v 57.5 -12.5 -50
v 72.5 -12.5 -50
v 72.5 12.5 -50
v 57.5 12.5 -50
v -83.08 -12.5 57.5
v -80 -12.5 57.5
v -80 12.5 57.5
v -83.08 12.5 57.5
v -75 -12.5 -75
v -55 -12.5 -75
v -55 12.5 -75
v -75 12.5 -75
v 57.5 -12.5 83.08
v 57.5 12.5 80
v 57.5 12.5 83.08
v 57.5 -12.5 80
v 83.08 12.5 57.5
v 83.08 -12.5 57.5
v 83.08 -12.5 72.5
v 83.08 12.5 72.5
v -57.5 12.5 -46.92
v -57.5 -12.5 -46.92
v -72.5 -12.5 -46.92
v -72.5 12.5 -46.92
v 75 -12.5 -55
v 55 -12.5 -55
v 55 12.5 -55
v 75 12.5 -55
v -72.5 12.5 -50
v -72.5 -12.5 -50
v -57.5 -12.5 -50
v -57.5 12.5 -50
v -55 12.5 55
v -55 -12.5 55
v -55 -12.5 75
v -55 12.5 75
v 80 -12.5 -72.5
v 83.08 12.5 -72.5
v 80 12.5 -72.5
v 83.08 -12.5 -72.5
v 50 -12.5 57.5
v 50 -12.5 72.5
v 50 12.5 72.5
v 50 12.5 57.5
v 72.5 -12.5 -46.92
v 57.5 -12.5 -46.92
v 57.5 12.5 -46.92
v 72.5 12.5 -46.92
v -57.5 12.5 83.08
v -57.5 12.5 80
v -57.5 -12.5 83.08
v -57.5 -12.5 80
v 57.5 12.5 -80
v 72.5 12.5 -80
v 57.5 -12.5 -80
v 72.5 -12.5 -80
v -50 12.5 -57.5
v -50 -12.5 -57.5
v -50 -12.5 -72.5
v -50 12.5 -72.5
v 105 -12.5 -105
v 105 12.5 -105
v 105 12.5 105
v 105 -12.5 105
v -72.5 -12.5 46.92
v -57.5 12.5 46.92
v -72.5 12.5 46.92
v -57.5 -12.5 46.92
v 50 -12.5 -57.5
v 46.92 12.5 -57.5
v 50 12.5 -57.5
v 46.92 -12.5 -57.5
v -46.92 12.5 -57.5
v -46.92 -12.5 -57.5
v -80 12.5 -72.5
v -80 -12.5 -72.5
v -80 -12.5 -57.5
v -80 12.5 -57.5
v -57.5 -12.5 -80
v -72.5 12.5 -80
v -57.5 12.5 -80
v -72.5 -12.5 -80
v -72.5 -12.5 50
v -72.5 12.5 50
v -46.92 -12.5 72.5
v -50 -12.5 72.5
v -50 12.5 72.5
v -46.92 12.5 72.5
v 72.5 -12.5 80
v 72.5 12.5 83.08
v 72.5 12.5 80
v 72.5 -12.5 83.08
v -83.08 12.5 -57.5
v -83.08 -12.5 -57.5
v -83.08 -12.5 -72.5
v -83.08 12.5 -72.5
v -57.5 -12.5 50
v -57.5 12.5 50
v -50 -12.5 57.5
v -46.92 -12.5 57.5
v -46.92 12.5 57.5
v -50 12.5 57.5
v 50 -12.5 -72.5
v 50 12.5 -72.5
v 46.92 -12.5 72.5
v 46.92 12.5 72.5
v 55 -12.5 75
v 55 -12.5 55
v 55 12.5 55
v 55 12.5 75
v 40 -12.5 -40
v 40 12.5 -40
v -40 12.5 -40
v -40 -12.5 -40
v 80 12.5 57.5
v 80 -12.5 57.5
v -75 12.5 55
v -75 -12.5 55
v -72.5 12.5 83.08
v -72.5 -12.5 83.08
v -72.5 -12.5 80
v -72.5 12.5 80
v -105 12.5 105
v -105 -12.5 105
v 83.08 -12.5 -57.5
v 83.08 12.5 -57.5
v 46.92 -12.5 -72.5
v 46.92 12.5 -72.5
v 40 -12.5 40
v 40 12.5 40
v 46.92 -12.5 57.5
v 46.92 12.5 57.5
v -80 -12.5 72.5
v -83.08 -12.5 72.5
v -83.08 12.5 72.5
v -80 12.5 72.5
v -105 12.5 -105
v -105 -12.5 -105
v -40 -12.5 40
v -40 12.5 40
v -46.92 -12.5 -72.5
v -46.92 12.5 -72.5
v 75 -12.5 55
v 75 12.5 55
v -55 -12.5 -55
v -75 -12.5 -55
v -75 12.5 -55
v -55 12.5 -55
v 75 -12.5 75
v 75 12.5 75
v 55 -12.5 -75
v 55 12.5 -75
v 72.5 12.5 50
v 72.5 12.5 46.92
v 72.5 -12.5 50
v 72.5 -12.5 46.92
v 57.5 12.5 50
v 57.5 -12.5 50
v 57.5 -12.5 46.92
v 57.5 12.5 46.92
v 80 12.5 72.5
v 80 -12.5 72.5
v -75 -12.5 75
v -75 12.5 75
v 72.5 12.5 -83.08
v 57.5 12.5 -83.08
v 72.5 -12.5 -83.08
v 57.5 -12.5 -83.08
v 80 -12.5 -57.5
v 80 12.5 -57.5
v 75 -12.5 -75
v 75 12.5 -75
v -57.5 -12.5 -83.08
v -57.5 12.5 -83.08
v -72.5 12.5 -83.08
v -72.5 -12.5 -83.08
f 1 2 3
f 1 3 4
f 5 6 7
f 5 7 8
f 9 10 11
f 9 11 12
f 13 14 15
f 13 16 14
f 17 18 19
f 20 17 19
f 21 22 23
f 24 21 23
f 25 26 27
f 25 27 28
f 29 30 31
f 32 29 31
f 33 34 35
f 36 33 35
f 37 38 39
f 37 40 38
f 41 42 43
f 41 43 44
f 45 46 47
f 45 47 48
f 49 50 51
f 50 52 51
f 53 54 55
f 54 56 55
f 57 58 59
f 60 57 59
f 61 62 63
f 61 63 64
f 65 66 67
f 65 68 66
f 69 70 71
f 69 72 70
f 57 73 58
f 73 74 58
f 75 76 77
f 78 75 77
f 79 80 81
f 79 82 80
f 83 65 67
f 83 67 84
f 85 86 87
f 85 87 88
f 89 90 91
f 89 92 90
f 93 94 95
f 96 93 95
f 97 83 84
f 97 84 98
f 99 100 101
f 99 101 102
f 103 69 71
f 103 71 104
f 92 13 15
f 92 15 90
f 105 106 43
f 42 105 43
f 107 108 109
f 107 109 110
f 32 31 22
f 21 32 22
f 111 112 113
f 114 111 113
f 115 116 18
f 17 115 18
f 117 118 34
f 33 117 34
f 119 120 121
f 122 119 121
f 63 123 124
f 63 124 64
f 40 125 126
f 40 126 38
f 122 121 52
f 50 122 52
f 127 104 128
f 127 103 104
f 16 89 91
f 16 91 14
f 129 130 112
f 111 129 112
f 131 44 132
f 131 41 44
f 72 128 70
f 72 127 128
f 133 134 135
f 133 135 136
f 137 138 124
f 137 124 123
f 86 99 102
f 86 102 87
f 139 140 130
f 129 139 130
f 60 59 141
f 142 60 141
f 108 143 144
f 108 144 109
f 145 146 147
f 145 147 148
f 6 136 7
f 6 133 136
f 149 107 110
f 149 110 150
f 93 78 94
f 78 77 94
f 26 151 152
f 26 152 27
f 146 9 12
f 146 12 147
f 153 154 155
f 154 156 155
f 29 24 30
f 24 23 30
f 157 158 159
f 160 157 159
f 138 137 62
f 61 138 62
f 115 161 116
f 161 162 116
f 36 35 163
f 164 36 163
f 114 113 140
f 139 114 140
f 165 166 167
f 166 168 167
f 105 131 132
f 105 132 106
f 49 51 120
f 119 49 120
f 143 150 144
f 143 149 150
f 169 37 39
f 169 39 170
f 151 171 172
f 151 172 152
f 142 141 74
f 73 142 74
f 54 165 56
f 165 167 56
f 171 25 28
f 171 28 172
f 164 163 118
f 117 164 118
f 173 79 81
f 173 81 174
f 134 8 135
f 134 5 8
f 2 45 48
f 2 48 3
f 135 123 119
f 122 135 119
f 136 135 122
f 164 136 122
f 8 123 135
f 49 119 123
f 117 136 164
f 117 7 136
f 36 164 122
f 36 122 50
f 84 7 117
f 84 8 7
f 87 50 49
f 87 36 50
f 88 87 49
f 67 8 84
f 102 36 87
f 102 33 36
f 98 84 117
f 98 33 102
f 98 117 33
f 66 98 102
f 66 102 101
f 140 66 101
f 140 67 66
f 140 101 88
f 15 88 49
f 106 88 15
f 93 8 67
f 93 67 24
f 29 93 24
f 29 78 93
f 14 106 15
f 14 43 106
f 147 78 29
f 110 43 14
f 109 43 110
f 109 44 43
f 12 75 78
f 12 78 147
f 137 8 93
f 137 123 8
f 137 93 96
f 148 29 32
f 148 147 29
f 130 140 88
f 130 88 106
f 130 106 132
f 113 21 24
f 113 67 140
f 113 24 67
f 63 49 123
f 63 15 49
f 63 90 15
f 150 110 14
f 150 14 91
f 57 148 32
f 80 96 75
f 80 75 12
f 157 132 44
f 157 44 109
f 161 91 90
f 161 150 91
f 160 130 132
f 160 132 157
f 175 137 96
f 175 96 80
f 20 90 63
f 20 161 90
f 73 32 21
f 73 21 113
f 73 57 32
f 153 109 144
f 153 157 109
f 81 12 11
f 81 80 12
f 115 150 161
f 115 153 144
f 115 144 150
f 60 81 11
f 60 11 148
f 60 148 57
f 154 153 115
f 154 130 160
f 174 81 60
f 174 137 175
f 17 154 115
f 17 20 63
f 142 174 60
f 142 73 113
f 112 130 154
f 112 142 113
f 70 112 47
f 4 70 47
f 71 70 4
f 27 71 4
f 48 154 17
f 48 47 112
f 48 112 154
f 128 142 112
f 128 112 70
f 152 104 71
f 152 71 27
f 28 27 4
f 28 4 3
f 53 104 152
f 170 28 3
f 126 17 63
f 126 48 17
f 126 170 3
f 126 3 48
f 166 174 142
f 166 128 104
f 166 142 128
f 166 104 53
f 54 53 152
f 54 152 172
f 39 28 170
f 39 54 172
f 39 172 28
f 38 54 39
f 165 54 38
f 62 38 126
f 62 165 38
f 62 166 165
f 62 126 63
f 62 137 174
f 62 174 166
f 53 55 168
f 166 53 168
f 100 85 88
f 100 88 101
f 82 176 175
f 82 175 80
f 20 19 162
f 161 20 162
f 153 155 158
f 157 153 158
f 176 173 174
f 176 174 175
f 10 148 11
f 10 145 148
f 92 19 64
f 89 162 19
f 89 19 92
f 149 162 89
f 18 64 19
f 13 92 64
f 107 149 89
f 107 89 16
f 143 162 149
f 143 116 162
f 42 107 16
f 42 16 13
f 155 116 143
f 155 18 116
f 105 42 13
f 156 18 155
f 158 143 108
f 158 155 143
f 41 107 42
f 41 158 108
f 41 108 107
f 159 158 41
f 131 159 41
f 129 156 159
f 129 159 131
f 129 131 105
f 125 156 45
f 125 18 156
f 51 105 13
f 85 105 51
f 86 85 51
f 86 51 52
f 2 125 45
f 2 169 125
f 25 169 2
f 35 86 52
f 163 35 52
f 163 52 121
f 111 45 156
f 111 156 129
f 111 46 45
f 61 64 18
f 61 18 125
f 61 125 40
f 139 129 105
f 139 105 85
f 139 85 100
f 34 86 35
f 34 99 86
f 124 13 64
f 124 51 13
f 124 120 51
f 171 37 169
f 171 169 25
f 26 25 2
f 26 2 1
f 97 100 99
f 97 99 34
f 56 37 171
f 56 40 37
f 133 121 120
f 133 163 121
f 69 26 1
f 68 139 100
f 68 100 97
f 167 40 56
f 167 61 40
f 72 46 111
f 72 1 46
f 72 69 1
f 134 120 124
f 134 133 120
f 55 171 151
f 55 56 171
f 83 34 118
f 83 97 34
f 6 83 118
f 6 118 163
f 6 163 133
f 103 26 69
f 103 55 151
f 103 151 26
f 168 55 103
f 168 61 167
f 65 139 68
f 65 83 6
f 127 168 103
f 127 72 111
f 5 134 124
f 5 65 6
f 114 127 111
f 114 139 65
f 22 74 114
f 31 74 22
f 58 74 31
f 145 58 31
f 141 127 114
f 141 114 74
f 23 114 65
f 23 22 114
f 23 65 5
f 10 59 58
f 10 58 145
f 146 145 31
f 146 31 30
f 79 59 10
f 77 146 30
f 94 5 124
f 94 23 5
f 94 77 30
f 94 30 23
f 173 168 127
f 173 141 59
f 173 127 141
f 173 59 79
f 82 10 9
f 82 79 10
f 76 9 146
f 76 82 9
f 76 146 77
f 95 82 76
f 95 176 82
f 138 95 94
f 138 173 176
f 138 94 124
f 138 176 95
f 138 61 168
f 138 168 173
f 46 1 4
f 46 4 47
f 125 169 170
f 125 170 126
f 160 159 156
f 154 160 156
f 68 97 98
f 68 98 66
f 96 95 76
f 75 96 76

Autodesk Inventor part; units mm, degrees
ref_plane "YZ Plane" through (0, 0, 0) normal (1, 0, 0) x (0, 1, 0)
ref_plane "XZ Plane" through (0, 0, 0) normal (0, 1, 0) x (-1, 0, 0)
ref_plane "XY Plane" through (0, 0, 0) normal (0, 0, 1) x (1, 0, 0)
sketch "Sketch1" plane through (0, 0, 0) normal (0, 0, 1) x (1, 0, 0)
  line L0 (-105, 12.5) -> (105, 12.5)
  line L1 (105, 12.5) -> (105, -12.5)
  line L2 (105, -12.5) -> (-105, -12.5)
  line L3 (-105, -12.5) -> (-105, 12.5)
  line L4 (-105, 12.5) -> (105, -12.5) construction
  line L5 (105, 12.5) -> (-105, -12.5) construction
  point P0 (0, 0)
  dimension "d0" = 210
  dimension "d1" = 25
extrude "Extrusion1" add sketch "Sketch1" along normal mid plane 210
sketch "Sketch2" plane through (-105, -12.5, 105) normal (0, -1, 0) x (1, 0, 0)
  line L0 (0, -210) -> (0, 0) projected
  line L1 (0, -40) -> (210, -40)
  line L2 (210, -210) -> (210, 0) projected
  line L3 (0, -170) -> (210, -170)
  line L4 (0, -105) -> (210, -105)
  line L5 (0, 0) -> (210, 0) projected
  line L6 (105, 0) -> (105, -210)
  line L7 (170, 0) -> (170, -210)
  line L8 (40, 0) -> (40, -210)
  line L9 (210, -210) -> (0, -210) projected
  line L10 (0, 0) -> (0, -210) projected
  line L11 (162.5, -21.92) -> (177.5, -21.92)
  line L12 (177.5, -21.92) -> (177.5, -25)
  line L13 (177.5, -25) -> (162.5, -25)
  line L14 (162.5, -25) -> (162.5, -21.92)
  line L15 (162.5, -21.92) -> (177.5, -25) construction
  line L16 (177.5, -21.92) -> (162.5, -25) construction
  line L17 (188.08, -32.5) -> (185, -32.5)
  line L18 (185, -32.5) -> (185, -47.5)
  line L19 (185, -47.5) -> (188.08, -47.5)
  line L20 (188.08, -47.5) -> (188.08, -32.5)
  line L21 (188.08, -32.5) -> (185, -47.5) construction
  line L22 (185, -32.5) -> (188.08, -47.5) construction
  line L23 (162.5, -58.08) -> (177.5, -58.08)
  line L24 (177.5, -58.08) -> (177.5, -55)
  line L25 (177.5, -55) -> (162.5, -55)
  line L26 (162.5, -55) -> (162.5, -58.08)
  line L27 (162.5, -58.08) -> (177.5, -55) construction
  line L28 (177.5, -58.08) -> (162.5, -55) construction
  line L29 (188.08, -47.5) -> (185, -47.5)
  line L30 (185, -47.5) -> (185, -32.5)
  line L31 (185, -32.5) -> (188.08, -32.5)
  line L32 (188.08, -32.5) -> (188.08, -47.5)
  line L33 (188.08, -47.5) -> (185, -32.5) construction
  line L34 (185, -47.5) -> (188.08, -32.5) construction
  line L35 (151.92, -32.5) -> (155, -32.5)
  line L36 (155, -32.5) -> (155, -47.5)
  line L37 (155, -47.5) -> (151.92, -47.5)
  line L38 (151.92, -47.5) -> (151.92, -32.5)
  line L39 (151.92, -32.5) -> (155, -47.5) construction
  line L40 (155, -32.5) -> (151.92, -47.5) construction
  line L41 (155, -32.5) -> (151.92, -32.5)
  line L42 (155, -47.5) -> (155, -32.5)
  line L43 (151.92, -32.5) -> (151.92, -47.5)
  line L44 (155, -47.5) -> (151.92, -32.5) construction
  line L45 (151.92, -47.5) -> (155, -47.5)
  line L46 (151.92, -47.5) -> (155, -32.5) construction
  line L47 (47.5, -21.92) -> (32.5, -21.92)
  line L48 (32.5, -21.92) -> (32.5, -25)
  line L49 (32.5, -25) -> (47.5, -25)
  line L50 (47.5, -25) -> (47.5, -21.92)
  line L51 (47.5, -21.92) -> (32.5, -25) construction
  line L52 (32.5, -21.92) -> (47.5, -25) construction
  line L53 (21.92, -32.5) -> (25, -32.5)
  line L54 (25, -32.5) -> (25, -47.5)
  line L55 (25, -47.5) -> (21.92, -47.5)
  line L56 (21.92, -47.5) -> (21.92, -32.5)
  line L57 (21.92, -32.5) -> (25, -47.5) construction
  line L58 (25, -32.5) -> (21.92, -47.5) construction
  line L59 (32.5, -55) -> (47.5, -55)
  line L60 (47.5, -58.08) -> (32.5, -58.08)
  line L61 (32.5, -58.08) -> (47.5, -55) construction
  line L62 (47.5, -58.08) -> (32.5, -55) construction
  line L63 (47.5, -55) -> (47.5, -58.08)
  line L64 (32.5, -58.08) -> (32.5, -55)
  line L65 (25, -32.5) -> (21.92, -32.5)
  line L66 (25, -47.5) -> (25, -32.5)
  line L67 (21.92, -32.5) -> (21.92, -47.5)
  line L68 (25, -47.5) -> (21.92, -32.5) construction
  line L69 (21.92, -47.5) -> (25, -47.5)
  line L70 (21.92, -47.5) -> (25, -32.5) construction
  line L71 (55, -32.5) -> (58.08, -32.5)
  line L72 (58.08, -32.5) -> (55, -32.5)
  line L73 (55, -47.5) -> (55, -32.5)
  line L74 (55, -32.5) -> (55, -47.5)
  line L75 (58.08, -47.5) -> (55, -47.5)
  line L76 (58.08, -32.5) -> (58.08, -47.5)
  line L77 (55, -47.5) -> (58.08, -32.5) construction
  line L78 (58.08, -47.5) -> (55, -32.5) construction
  line L79 (55, -47.5) -> (58.08, -47.5)
  line L80 (58.08, -47.5) -> (58.08, -32.5)
  line L81 (55, -32.5) -> (58.08, -47.5) construction
  line L82 (58.08, -32.5) -> (55, -47.5) construction
  line L83 (162.5, -188.08) -> (177.5, -188.08)
  line L84 (177.5, -188.08) -> (177.5, -185)
  line L85 (177.5, -185) -> (162.5, -185)
  line L86 (162.5, -185) -> (162.5, -188.08)
  line L87 (162.5, -188.08) -> (177.5, -185) construction
  line L88 (177.5, -188.08) -> (162.5, -185) construction
  line L89 (188.08, -177.5) -> (185, -177.5)
  line L90 (185, -177.5) -> (185, -162.5)
  line L91 (185, -162.5) -> (188.08, -162.5)
  line L92 (188.08, -162.5) -> (188.08, -177.5)
  line L93 (188.08, -177.5) -> (185, -162.5) construction
  line L94 (185, -177.5) -> (188.08, -162.5) construction
  line L95 (177.5, -155) -> (162.5, -155)
  line L96 (162.5, -151.92) -> (177.5, -151.92)
  line L97 (177.5, -151.92) -> (162.5, -155) construction
  line L98 (162.5, -151.92) -> (177.5, -155) construction
  line L99 (162.5, -155) -> (162.5, -151.92)
  line L100 (177.5, -151.92) -> (177.5, -155)
  line L101 (185, -177.5) -> (188.08, -177.5)
  line L102 (185, -162.5) -> (185, -177.5)
  line L103 (188.08, -177.5) -> (188.08, -162.5)
  line L104 (185, -162.5) -> (188.08, -177.5) construction
  line L105 (188.08, -162.5) -> (185, -162.5)
  line L106 (188.08, -162.5) -> (185, -177.5) construction
  line L107 (155, -177.5) -> (151.92, -177.5)
  line L108 (151.92, -177.5) -> (155, -177.5)
  line L109 (155, -162.5) -> (155, -177.5)
  line L110 (155, -177.5) -> (155, -162.5)
  line L111 (151.92, -162.5) -> (155, -162.5)
  line L112 (151.92, -177.5) -> (151.92, -162.5)
  line L113 (155, -162.5) -> (151.92, -177.5) construction
  line L114 (151.92, -162.5) -> (155, -177.5) construction
  line L115 (155, -162.5) -> (151.92, -162.5)
  line L116 (151.92, -162.5) -> (151.92, -177.5)
  line L117 (155, -177.5) -> (151.92, -162.5) construction
  line L118 (151.92, -177.5) -> (155, -162.5) construction
  line L119 (55, -177.5) -> (58.08, -177.5)
  line L120 (58.08, -177.5) -> (58.08, -162.5)
  line L121 (55, -162.5) -> (58.08, -177.5) construction
  line L122 (58.08, -162.5) -> (55, -177.5) construction
  line L123 (58.08, -177.5) -> (55, -177.5)
  line L124 (58.08, -162.5) -> (58.08, -177.5)
  line L125 (55, -177.5) -> (58.08, -162.5) construction
  line L126 (58.08, -177.5) -> (55, -162.5) construction
  line L127 (58.08, -162.5) -> (55, -162.5)
  line L128 (55, -162.5) -> (58.08, -162.5)
  line L129 (25, -162.5) -> (21.92, -162.5)
  line L130 (21.92, -162.5) -> (25, -162.5)
  line L131 (25, -177.5) -> (25, -162.5)
  line L132 (25, -162.5) -> (25, -177.5)
  line L133 (21.92, -162.5) -> (21.92, -177.5)
  line L134 (25, -177.5) -> (21.92, -162.5) construction
  line L135 (21.92, -177.5) -> (25, -162.5) construction
  line L136 (21.92, -177.5) -> (25, -177.5)
  line L137 (21.92, -162.5) -> (25, -177.5) construction
  line L138 (21.92, -177.5) -> (21.92, -162.5)
  line L139 (25, -177.5) -> (21.92, -177.5)
  line L140 (25, -162.5) -> (21.92, -177.5) construction
  line L141 (47.5, -188.08) -> (32.5, -188.08)
  line L142 (32.5, -188.08) -> (32.5, -185)
  line L143 (32.5, -185) -> (47.5, -185)
  line L144 (47.5, -185) -> (47.5, -188.08)
  line L145 (47.5, -188.08) -> (32.5, -185) construction
  line L146 (32.5, -188.08) -> (47.5, -185) construction
  line L147 (55, -162.5) -> (55, -177.5)
  line L148 (55, -177.5) -> (55, -162.5)
  line L149 (32.5, -151.92) -> (32.5, -155)
  line L150 (32.5, -155) -> (47.5, -155)
  line L151 (32.5, -151.92) -> (47.5, -155) construction
  line L152 (47.5, -151.92) -> (32.5, -155) construction
  line L153 (47.5, -155) -> (47.5, -151.92)
  line L154 (47.5, -151.92) -> (32.5, -151.92)
  line L155 (160, -30) -> (180, -30)
  line L156 (180, -30) -> (180, -50)
  line L157 (180, -50) -> (160, -50)
  line L158 (160, -50) -> (160, -30)
  line L159 (160, -30) -> (180, -50) construction
  line L160 (180, -30) -> (160, -50) construction
  line L161 (30, -50) -> (50, -50)
  line L162 (50, -50) -> (50, -30)
  line L163 (50, -30) -> (30, -30)
  line L164 (30, -30) -> (30, -50)
  line L165 (30, -50) -> (50, -30) construction
  line L166 (50, -50) -> (30, -30) construction
  line L167 (30, -160) -> (50, -160)
  line L168 (50, -160) -> (50, -180)
  line L169 (50, -180) -> (30, -180)
  line L170 (30, -180) -> (30, -160)
  line L171 (30, -160) -> (50, -180) construction
  line L172 (50, -160) -> (30, -180) construction
  line L173 (160, -160) -> (180, -160)
  line L174 (180, -160) -> (180, -180)
  line L175 (180, -180) -> (160, -180)
  line L176 (160, -180) -> (160, -160)
  line L177 (160, -160) -> (180, -180) construction
  line L178 (180, -160) -> (160, -180) construction
  point P0 (105, -105)
  point P1 (170, -23.46)
  point P2 (186.54, -40)
  point P3 (170, -56.54)
  point P4 (153.46, -40)
  point P5 (40, -23.46)
  point P6 (23.46, -40)
  point P7 (40, -56.54)
  point P8 (56.54, -40)
  point P9 (170, -186.54)
  point P10 (186.54, -170)
  point P11 (170, -153.46)
  point P12 (153.46, -170)
  point P13 (56.54, -170)
  point P14 (23.46, -170)
  point P15 (40, -186.54)
  point P16 (40, -153.46)
  point P17 (170, -40)
  point P18 (40, -40)
  point P19 (40, -170)
  point P20 (170, -170)
  dimension "d4" = 40
  dimension "d5" = 40
  dimension "d8" = 15
  dimension "d9" = 3.08
  dimension "d10" = 30
  dimension "d11" = 15
  dimension "d12" = 30
  dimension "d13" = 3.08
  dimension "d20" = 20
  dimension "d21" = 20
  dimension "d22" = 20
  dimension "d23" = 20
  dimension "d24" = 20
  dimension "d25" = 20
  dimension "d26" = 20
  dimension "d27" = 20
extrude "Extrusion2" cut sketch "Sketch2" against normal through all contours L133 L129 L131 L3 | L3 L131 L136 L133 | L141 L142 L143 L8 | L8 L143 L144 L141 | L56 L53 L54 L1 | L1 L54 L55 L56 | L60 L64 L59 L8 | L8 L59 L63 L60 | L154 L153 L150 L8 | L8 L150 L149 L154 | L170 L167 L8 L3 | L3 L8 L169 L170 | L8 L3 L168 L169 | L120 L119 L147 L3 | L3 L147 L127 L120 | L112 L111 L109 L3 | L3 L109 L107 L112 | L83 L86 L85 L7 | L7 L85 L84 L83 | L8 L167 L168 L3 | L47 L50 L49 L8 | L8 L49 L48 L47 | L164 L163 L8 L1 | L1 L8 L161 L164 | L23 L26 L25 L7 | L7 L25 L24 L23 | L96 L100 L95 L7 | L7 L95 L99 L96 | L76 L75 L73 L1 | L1 L73 L71 L76 | L38 L35 L36 L1 | L1 L36 L37 L38 | L8 L1 L162 L161 | L176 L173 L7 L3 | L3 L7 L175 L176 | L7 L3 L174 L175 | L92 L89 L90 L3 | L3 L90 L91 L92 | L8 L163 L162 L1 | L7 L173 L174 L3 | L11 L12 L13 L7 | L7 L13 L14 L11 | L20 L19 L18 L1 | L1 L18 L17 L20 | L157 L158 L1 L7 | L7 L1 L156 L157 | L158 L155 L7 L1 | L7 L155 L156 L1
sketch "Sketch3" plane through (-105, 12.5, 105) normal (0, 1, 0) x (1, 0, 0)
  line L0 (65, 65) -> (145, 65)
  line L1 (145, 65) -> (145, 145)
  line L2 (145, 145) -> (65, 145)
  line L3 (65, 145) -> (65, 65)
  line L4 (65, 65) -> (145, 145) construction
  line L5 (145, 65) -> (65, 145) construction
  point P0 (105, 105)
  dimension "d16" = 80
  dimension "d17" = 80
extrude "Extrusion3" cut sketch "Sketch3" against normal through all
equation "\"d5\" = d4"
equation "\"d12\" = d10"
equation "\"d13\" = d9"
properties part number "Box Of Fixation"
